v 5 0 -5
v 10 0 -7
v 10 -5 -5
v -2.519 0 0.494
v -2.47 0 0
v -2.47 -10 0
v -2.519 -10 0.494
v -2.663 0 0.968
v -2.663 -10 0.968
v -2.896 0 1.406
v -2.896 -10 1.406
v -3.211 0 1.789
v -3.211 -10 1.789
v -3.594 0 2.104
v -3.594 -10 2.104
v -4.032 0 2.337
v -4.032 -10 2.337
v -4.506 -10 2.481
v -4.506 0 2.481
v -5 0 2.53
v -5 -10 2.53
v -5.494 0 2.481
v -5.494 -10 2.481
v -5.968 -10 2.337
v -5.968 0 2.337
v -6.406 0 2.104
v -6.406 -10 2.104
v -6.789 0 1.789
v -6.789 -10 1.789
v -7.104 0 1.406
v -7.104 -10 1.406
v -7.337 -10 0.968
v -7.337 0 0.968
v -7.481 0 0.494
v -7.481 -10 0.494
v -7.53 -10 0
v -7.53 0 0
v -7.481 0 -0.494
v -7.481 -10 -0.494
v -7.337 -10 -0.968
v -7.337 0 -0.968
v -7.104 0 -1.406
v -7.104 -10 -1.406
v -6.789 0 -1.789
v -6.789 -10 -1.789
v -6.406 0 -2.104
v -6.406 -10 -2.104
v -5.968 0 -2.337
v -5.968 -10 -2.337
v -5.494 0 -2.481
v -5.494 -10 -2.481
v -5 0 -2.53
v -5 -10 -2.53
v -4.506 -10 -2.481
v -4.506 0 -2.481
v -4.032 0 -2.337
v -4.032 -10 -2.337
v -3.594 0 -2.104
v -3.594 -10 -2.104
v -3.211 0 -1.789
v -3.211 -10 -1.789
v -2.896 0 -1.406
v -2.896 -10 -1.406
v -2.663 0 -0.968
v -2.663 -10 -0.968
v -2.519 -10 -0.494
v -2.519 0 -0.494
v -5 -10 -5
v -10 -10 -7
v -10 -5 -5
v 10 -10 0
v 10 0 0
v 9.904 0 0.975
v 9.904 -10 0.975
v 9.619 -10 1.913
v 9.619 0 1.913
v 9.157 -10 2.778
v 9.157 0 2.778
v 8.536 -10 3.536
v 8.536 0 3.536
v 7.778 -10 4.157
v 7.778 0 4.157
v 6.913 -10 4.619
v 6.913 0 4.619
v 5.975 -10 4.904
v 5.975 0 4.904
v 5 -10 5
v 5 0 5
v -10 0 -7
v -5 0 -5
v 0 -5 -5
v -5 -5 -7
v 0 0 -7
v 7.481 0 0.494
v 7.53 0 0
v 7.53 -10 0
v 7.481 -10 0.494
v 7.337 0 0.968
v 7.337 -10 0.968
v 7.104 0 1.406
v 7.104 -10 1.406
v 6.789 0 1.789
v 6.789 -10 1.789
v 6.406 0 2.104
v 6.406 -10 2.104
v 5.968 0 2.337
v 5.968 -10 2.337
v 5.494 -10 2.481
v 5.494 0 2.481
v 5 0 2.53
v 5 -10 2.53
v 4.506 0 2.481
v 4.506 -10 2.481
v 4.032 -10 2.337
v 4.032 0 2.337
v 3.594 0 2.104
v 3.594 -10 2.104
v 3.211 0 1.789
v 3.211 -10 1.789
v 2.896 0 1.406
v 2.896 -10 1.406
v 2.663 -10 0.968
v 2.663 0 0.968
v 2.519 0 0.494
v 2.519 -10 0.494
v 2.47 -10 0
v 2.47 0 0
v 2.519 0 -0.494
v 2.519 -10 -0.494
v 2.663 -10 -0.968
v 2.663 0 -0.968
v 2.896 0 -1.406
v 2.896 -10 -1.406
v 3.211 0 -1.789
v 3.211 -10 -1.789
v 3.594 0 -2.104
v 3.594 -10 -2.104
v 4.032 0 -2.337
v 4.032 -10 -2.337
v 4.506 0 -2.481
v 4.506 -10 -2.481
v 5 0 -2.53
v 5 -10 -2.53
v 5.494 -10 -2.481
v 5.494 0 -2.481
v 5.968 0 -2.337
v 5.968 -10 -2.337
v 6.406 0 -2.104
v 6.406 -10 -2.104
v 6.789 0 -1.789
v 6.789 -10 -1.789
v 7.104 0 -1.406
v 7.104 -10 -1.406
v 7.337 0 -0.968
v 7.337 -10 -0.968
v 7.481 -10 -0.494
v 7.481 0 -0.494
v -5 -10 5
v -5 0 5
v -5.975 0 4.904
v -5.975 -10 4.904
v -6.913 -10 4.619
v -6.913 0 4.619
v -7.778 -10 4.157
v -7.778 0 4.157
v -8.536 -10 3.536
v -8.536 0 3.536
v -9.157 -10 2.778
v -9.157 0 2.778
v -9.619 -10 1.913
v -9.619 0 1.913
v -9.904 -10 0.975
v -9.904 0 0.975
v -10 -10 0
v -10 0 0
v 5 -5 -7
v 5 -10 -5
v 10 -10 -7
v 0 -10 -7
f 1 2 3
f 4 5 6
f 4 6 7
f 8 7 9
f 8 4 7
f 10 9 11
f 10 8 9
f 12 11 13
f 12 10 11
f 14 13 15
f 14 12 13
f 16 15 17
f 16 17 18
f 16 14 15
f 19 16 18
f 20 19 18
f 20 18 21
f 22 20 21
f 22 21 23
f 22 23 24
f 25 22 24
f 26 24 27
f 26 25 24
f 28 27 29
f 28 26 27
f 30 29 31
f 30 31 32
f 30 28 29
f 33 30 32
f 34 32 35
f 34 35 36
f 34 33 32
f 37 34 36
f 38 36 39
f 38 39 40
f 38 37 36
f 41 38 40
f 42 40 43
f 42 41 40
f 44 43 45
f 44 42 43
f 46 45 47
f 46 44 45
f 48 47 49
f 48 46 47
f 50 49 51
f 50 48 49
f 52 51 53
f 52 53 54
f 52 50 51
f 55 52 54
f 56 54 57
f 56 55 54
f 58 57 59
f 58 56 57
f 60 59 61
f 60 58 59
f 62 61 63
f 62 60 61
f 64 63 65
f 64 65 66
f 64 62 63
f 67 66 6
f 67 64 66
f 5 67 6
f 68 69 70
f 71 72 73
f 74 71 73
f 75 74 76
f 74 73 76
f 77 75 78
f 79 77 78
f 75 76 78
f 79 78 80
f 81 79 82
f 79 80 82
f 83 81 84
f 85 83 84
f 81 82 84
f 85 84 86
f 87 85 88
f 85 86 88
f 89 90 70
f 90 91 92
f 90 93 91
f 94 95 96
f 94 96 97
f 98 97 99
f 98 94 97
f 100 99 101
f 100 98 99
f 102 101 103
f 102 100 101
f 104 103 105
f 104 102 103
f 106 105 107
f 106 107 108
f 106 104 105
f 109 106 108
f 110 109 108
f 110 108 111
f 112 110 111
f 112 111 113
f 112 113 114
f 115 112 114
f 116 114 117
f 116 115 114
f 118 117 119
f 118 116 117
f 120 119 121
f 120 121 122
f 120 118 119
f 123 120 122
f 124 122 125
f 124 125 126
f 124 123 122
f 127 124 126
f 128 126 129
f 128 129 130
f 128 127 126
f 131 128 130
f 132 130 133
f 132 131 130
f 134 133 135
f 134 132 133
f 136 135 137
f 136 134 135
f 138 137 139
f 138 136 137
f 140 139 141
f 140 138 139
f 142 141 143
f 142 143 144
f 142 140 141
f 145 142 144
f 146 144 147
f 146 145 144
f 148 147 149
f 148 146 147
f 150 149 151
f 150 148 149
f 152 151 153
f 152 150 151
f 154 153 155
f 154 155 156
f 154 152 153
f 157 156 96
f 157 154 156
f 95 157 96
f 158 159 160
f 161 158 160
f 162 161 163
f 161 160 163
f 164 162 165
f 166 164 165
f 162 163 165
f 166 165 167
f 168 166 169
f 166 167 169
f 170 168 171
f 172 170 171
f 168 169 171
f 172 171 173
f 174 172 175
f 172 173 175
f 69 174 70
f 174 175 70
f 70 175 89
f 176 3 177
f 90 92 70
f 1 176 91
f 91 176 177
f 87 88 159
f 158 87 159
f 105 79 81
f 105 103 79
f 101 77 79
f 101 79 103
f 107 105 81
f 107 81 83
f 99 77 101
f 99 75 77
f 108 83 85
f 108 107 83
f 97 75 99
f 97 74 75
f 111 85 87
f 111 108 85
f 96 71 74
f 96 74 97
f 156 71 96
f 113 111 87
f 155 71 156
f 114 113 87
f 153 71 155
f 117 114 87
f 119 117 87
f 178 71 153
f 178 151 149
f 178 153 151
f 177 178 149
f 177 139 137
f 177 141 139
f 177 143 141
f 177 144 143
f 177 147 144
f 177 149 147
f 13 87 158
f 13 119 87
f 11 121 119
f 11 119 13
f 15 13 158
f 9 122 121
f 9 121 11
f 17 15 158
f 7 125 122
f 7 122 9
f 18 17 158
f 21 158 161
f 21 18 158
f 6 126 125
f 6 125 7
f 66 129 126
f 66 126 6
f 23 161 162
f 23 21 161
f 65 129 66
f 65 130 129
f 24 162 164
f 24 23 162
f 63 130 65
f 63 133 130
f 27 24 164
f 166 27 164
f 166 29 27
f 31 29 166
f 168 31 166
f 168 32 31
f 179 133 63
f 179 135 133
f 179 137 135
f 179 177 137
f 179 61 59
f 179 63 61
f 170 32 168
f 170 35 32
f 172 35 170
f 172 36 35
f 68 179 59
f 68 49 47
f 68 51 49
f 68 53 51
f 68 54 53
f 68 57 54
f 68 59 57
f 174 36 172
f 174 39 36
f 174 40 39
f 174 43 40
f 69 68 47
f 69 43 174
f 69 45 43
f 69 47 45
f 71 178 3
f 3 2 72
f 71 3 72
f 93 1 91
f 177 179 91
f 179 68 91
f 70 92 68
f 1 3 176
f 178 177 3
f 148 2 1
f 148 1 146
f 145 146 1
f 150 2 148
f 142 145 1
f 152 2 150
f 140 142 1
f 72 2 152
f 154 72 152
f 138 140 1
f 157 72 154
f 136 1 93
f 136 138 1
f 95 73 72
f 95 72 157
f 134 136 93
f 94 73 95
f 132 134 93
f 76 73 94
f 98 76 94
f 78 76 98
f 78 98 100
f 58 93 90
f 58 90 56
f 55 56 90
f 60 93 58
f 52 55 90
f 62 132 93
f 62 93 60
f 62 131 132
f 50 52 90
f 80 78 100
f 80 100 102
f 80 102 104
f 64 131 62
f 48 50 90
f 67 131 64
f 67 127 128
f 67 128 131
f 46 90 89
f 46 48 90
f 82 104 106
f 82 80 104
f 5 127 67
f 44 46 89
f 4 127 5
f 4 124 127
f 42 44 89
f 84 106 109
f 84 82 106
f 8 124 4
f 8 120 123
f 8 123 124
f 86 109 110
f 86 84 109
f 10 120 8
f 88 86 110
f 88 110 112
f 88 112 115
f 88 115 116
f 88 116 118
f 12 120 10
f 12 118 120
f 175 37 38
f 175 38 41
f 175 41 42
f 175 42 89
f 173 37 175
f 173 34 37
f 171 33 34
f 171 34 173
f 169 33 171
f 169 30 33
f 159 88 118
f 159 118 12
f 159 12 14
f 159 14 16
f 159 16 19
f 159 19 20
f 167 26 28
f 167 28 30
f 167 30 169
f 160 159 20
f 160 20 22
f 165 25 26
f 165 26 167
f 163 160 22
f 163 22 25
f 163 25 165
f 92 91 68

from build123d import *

# Parameters (mm, degrees)
F0_R     = 2.53
F1_DEPTH = 10


with BuildPart() as f1:
    # F0 (on Front) → F1 (new body)
    with BuildSketch(Plane.XZ):
        with BuildLine():
            Line((5, 5), (-5, 5))
            ThreePointArc((-5, 5), (-8.5355339059, 3.5355339059), (-10, 0))
            Line((-10, 0), (-10, -5))
            Line((-10, -5), (10, -5))
            Line((10, -5), (10, 0))
            ThreePointArc((10, 0), (8.5355339059, 3.5355339059), (5, 5))
        make_face()
        with Locations((-5, 0)):
            Circle(F0_R, mode=Mode.SUBTRACT)
        with Locations((5, 0)):
            Circle(F0_R, mode=Mode.SUBTRACT)
    extrude(amount=F1_DEPTH)

    # F3 (on face) → F6 section 0
    with BuildSketch(Plane(origin=(0, 0, 0), x_dir=(-1, 0, 0), z_dir=(0, 1, 0)), mode=Mode.PRIVATE) as f6_s0:
        Polygon((0, -7), (5, -5), (-5, -5), align=None)
    loft([f6_s0.sketch, Vertex(0, -5, -5)])

    # F3 (on face) → F7 section 0
    with BuildSketch(Plane(origin=(0, 0, 0), x_dir=(-1, 0, 0), z_dir=(0, 1, 0)), mode=Mode.PRIVATE) as f7_s0:
        Polygon((5, -5), (10, -7), (10, -5), align=None)
    loft([f7_s0.sketch, Vertex(-10, -5, -5)])

    # F5 (on offset) → F8 section 0
    with BuildSketch(Plane(origin=(0, -5, 0), x_dir=(-1, 0, 0), z_dir=(0, 1, 0)), mode=Mode.PRIVATE) as f8_s0:
        Polygon((5, -7), (10, -5), (0, -5), align=None)
    loft([f8_s0.sketch, Vertex(-5, 0, -5)])

    # F3 (on face) → F9 section 0
    with BuildSketch(Plane(origin=(0, 0, 0), x_dir=(-1, 0, 0), z_dir=(0, 1, 0)), mode=Mode.PRIVATE) as f9_s0:
        Polygon((-10, -7), (-5, -5), (-10, -5), align=None)
    loft([f9_s0.sketch, Vertex(10, -5, -5)])

    # F5 (on offset) → F10 section 0
    with BuildSketch(Plane(origin=(0, -5, 0), x_dir=(-1, 0, 0), z_dir=(0, 1, 0)), mode=Mode.PRIVATE) as f10_s0:
        Polygon((-5, -7), (0, -5), (-10, -5), align=None)
    loft([f10_s0.sketch, Vertex(5, 0, -5)])

    # F2 (on face) → F11 section 0
    with BuildSketch(Plane.XZ.offset(10), mode=Mode.PRIVATE) as f11_s0:
        Polygon((-5, -5), (-10, -5), (-10, -7), align=None)
    loft([f11_s0.sketch, Vertex(-10, -5, -5)])

    # F2 (on face) → F12 section 0
    with BuildSketch(Plane.XZ.offset(10), mode=Mode.PRIVATE) as f12_s0:
        Polygon((10, -5), (5, -5), (10, -7), align=None)
    loft([f12_s0.sketch, Vertex(10, -5, -5)])

    # F2 (on face) → F13 section 0
    with BuildSketch(Plane.XZ.offset(10), mode=Mode.PRIVATE) as f13_s0:
        Polygon((5, -5), (-5, -5), (0, -7), align=None)
    loft([f13_s0.sketch, Vertex(0, -5, -5)])

    # F5 (on offset) → F14 section 0
    with BuildSketch(Plane(origin=(0, -5, 0), x_dir=(-1, 0, 0), z_dir=(0, 1, 0)), mode=Mode.PRIVATE) as f14_s0:
        Polygon((5, -7), (10, -5), (0, -5), align=None)
    loft([f14_s0.sketch, Vertex(-5, -10, -5)])

    # F5 (on offset) → F15 section 0
    with BuildSketch(Plane(origin=(0, -5, 0), x_dir=(-1, 0, 0), z_dir=(0, 1, 0)), mode=Mode.PRIVATE) as f15_s0:
        Polygon((-5, -7), (0, -5), (-10, -5), align=None)
    loft([f15_s0.sketch, Vertex(5, -10, -5)])


solid = f1.part
